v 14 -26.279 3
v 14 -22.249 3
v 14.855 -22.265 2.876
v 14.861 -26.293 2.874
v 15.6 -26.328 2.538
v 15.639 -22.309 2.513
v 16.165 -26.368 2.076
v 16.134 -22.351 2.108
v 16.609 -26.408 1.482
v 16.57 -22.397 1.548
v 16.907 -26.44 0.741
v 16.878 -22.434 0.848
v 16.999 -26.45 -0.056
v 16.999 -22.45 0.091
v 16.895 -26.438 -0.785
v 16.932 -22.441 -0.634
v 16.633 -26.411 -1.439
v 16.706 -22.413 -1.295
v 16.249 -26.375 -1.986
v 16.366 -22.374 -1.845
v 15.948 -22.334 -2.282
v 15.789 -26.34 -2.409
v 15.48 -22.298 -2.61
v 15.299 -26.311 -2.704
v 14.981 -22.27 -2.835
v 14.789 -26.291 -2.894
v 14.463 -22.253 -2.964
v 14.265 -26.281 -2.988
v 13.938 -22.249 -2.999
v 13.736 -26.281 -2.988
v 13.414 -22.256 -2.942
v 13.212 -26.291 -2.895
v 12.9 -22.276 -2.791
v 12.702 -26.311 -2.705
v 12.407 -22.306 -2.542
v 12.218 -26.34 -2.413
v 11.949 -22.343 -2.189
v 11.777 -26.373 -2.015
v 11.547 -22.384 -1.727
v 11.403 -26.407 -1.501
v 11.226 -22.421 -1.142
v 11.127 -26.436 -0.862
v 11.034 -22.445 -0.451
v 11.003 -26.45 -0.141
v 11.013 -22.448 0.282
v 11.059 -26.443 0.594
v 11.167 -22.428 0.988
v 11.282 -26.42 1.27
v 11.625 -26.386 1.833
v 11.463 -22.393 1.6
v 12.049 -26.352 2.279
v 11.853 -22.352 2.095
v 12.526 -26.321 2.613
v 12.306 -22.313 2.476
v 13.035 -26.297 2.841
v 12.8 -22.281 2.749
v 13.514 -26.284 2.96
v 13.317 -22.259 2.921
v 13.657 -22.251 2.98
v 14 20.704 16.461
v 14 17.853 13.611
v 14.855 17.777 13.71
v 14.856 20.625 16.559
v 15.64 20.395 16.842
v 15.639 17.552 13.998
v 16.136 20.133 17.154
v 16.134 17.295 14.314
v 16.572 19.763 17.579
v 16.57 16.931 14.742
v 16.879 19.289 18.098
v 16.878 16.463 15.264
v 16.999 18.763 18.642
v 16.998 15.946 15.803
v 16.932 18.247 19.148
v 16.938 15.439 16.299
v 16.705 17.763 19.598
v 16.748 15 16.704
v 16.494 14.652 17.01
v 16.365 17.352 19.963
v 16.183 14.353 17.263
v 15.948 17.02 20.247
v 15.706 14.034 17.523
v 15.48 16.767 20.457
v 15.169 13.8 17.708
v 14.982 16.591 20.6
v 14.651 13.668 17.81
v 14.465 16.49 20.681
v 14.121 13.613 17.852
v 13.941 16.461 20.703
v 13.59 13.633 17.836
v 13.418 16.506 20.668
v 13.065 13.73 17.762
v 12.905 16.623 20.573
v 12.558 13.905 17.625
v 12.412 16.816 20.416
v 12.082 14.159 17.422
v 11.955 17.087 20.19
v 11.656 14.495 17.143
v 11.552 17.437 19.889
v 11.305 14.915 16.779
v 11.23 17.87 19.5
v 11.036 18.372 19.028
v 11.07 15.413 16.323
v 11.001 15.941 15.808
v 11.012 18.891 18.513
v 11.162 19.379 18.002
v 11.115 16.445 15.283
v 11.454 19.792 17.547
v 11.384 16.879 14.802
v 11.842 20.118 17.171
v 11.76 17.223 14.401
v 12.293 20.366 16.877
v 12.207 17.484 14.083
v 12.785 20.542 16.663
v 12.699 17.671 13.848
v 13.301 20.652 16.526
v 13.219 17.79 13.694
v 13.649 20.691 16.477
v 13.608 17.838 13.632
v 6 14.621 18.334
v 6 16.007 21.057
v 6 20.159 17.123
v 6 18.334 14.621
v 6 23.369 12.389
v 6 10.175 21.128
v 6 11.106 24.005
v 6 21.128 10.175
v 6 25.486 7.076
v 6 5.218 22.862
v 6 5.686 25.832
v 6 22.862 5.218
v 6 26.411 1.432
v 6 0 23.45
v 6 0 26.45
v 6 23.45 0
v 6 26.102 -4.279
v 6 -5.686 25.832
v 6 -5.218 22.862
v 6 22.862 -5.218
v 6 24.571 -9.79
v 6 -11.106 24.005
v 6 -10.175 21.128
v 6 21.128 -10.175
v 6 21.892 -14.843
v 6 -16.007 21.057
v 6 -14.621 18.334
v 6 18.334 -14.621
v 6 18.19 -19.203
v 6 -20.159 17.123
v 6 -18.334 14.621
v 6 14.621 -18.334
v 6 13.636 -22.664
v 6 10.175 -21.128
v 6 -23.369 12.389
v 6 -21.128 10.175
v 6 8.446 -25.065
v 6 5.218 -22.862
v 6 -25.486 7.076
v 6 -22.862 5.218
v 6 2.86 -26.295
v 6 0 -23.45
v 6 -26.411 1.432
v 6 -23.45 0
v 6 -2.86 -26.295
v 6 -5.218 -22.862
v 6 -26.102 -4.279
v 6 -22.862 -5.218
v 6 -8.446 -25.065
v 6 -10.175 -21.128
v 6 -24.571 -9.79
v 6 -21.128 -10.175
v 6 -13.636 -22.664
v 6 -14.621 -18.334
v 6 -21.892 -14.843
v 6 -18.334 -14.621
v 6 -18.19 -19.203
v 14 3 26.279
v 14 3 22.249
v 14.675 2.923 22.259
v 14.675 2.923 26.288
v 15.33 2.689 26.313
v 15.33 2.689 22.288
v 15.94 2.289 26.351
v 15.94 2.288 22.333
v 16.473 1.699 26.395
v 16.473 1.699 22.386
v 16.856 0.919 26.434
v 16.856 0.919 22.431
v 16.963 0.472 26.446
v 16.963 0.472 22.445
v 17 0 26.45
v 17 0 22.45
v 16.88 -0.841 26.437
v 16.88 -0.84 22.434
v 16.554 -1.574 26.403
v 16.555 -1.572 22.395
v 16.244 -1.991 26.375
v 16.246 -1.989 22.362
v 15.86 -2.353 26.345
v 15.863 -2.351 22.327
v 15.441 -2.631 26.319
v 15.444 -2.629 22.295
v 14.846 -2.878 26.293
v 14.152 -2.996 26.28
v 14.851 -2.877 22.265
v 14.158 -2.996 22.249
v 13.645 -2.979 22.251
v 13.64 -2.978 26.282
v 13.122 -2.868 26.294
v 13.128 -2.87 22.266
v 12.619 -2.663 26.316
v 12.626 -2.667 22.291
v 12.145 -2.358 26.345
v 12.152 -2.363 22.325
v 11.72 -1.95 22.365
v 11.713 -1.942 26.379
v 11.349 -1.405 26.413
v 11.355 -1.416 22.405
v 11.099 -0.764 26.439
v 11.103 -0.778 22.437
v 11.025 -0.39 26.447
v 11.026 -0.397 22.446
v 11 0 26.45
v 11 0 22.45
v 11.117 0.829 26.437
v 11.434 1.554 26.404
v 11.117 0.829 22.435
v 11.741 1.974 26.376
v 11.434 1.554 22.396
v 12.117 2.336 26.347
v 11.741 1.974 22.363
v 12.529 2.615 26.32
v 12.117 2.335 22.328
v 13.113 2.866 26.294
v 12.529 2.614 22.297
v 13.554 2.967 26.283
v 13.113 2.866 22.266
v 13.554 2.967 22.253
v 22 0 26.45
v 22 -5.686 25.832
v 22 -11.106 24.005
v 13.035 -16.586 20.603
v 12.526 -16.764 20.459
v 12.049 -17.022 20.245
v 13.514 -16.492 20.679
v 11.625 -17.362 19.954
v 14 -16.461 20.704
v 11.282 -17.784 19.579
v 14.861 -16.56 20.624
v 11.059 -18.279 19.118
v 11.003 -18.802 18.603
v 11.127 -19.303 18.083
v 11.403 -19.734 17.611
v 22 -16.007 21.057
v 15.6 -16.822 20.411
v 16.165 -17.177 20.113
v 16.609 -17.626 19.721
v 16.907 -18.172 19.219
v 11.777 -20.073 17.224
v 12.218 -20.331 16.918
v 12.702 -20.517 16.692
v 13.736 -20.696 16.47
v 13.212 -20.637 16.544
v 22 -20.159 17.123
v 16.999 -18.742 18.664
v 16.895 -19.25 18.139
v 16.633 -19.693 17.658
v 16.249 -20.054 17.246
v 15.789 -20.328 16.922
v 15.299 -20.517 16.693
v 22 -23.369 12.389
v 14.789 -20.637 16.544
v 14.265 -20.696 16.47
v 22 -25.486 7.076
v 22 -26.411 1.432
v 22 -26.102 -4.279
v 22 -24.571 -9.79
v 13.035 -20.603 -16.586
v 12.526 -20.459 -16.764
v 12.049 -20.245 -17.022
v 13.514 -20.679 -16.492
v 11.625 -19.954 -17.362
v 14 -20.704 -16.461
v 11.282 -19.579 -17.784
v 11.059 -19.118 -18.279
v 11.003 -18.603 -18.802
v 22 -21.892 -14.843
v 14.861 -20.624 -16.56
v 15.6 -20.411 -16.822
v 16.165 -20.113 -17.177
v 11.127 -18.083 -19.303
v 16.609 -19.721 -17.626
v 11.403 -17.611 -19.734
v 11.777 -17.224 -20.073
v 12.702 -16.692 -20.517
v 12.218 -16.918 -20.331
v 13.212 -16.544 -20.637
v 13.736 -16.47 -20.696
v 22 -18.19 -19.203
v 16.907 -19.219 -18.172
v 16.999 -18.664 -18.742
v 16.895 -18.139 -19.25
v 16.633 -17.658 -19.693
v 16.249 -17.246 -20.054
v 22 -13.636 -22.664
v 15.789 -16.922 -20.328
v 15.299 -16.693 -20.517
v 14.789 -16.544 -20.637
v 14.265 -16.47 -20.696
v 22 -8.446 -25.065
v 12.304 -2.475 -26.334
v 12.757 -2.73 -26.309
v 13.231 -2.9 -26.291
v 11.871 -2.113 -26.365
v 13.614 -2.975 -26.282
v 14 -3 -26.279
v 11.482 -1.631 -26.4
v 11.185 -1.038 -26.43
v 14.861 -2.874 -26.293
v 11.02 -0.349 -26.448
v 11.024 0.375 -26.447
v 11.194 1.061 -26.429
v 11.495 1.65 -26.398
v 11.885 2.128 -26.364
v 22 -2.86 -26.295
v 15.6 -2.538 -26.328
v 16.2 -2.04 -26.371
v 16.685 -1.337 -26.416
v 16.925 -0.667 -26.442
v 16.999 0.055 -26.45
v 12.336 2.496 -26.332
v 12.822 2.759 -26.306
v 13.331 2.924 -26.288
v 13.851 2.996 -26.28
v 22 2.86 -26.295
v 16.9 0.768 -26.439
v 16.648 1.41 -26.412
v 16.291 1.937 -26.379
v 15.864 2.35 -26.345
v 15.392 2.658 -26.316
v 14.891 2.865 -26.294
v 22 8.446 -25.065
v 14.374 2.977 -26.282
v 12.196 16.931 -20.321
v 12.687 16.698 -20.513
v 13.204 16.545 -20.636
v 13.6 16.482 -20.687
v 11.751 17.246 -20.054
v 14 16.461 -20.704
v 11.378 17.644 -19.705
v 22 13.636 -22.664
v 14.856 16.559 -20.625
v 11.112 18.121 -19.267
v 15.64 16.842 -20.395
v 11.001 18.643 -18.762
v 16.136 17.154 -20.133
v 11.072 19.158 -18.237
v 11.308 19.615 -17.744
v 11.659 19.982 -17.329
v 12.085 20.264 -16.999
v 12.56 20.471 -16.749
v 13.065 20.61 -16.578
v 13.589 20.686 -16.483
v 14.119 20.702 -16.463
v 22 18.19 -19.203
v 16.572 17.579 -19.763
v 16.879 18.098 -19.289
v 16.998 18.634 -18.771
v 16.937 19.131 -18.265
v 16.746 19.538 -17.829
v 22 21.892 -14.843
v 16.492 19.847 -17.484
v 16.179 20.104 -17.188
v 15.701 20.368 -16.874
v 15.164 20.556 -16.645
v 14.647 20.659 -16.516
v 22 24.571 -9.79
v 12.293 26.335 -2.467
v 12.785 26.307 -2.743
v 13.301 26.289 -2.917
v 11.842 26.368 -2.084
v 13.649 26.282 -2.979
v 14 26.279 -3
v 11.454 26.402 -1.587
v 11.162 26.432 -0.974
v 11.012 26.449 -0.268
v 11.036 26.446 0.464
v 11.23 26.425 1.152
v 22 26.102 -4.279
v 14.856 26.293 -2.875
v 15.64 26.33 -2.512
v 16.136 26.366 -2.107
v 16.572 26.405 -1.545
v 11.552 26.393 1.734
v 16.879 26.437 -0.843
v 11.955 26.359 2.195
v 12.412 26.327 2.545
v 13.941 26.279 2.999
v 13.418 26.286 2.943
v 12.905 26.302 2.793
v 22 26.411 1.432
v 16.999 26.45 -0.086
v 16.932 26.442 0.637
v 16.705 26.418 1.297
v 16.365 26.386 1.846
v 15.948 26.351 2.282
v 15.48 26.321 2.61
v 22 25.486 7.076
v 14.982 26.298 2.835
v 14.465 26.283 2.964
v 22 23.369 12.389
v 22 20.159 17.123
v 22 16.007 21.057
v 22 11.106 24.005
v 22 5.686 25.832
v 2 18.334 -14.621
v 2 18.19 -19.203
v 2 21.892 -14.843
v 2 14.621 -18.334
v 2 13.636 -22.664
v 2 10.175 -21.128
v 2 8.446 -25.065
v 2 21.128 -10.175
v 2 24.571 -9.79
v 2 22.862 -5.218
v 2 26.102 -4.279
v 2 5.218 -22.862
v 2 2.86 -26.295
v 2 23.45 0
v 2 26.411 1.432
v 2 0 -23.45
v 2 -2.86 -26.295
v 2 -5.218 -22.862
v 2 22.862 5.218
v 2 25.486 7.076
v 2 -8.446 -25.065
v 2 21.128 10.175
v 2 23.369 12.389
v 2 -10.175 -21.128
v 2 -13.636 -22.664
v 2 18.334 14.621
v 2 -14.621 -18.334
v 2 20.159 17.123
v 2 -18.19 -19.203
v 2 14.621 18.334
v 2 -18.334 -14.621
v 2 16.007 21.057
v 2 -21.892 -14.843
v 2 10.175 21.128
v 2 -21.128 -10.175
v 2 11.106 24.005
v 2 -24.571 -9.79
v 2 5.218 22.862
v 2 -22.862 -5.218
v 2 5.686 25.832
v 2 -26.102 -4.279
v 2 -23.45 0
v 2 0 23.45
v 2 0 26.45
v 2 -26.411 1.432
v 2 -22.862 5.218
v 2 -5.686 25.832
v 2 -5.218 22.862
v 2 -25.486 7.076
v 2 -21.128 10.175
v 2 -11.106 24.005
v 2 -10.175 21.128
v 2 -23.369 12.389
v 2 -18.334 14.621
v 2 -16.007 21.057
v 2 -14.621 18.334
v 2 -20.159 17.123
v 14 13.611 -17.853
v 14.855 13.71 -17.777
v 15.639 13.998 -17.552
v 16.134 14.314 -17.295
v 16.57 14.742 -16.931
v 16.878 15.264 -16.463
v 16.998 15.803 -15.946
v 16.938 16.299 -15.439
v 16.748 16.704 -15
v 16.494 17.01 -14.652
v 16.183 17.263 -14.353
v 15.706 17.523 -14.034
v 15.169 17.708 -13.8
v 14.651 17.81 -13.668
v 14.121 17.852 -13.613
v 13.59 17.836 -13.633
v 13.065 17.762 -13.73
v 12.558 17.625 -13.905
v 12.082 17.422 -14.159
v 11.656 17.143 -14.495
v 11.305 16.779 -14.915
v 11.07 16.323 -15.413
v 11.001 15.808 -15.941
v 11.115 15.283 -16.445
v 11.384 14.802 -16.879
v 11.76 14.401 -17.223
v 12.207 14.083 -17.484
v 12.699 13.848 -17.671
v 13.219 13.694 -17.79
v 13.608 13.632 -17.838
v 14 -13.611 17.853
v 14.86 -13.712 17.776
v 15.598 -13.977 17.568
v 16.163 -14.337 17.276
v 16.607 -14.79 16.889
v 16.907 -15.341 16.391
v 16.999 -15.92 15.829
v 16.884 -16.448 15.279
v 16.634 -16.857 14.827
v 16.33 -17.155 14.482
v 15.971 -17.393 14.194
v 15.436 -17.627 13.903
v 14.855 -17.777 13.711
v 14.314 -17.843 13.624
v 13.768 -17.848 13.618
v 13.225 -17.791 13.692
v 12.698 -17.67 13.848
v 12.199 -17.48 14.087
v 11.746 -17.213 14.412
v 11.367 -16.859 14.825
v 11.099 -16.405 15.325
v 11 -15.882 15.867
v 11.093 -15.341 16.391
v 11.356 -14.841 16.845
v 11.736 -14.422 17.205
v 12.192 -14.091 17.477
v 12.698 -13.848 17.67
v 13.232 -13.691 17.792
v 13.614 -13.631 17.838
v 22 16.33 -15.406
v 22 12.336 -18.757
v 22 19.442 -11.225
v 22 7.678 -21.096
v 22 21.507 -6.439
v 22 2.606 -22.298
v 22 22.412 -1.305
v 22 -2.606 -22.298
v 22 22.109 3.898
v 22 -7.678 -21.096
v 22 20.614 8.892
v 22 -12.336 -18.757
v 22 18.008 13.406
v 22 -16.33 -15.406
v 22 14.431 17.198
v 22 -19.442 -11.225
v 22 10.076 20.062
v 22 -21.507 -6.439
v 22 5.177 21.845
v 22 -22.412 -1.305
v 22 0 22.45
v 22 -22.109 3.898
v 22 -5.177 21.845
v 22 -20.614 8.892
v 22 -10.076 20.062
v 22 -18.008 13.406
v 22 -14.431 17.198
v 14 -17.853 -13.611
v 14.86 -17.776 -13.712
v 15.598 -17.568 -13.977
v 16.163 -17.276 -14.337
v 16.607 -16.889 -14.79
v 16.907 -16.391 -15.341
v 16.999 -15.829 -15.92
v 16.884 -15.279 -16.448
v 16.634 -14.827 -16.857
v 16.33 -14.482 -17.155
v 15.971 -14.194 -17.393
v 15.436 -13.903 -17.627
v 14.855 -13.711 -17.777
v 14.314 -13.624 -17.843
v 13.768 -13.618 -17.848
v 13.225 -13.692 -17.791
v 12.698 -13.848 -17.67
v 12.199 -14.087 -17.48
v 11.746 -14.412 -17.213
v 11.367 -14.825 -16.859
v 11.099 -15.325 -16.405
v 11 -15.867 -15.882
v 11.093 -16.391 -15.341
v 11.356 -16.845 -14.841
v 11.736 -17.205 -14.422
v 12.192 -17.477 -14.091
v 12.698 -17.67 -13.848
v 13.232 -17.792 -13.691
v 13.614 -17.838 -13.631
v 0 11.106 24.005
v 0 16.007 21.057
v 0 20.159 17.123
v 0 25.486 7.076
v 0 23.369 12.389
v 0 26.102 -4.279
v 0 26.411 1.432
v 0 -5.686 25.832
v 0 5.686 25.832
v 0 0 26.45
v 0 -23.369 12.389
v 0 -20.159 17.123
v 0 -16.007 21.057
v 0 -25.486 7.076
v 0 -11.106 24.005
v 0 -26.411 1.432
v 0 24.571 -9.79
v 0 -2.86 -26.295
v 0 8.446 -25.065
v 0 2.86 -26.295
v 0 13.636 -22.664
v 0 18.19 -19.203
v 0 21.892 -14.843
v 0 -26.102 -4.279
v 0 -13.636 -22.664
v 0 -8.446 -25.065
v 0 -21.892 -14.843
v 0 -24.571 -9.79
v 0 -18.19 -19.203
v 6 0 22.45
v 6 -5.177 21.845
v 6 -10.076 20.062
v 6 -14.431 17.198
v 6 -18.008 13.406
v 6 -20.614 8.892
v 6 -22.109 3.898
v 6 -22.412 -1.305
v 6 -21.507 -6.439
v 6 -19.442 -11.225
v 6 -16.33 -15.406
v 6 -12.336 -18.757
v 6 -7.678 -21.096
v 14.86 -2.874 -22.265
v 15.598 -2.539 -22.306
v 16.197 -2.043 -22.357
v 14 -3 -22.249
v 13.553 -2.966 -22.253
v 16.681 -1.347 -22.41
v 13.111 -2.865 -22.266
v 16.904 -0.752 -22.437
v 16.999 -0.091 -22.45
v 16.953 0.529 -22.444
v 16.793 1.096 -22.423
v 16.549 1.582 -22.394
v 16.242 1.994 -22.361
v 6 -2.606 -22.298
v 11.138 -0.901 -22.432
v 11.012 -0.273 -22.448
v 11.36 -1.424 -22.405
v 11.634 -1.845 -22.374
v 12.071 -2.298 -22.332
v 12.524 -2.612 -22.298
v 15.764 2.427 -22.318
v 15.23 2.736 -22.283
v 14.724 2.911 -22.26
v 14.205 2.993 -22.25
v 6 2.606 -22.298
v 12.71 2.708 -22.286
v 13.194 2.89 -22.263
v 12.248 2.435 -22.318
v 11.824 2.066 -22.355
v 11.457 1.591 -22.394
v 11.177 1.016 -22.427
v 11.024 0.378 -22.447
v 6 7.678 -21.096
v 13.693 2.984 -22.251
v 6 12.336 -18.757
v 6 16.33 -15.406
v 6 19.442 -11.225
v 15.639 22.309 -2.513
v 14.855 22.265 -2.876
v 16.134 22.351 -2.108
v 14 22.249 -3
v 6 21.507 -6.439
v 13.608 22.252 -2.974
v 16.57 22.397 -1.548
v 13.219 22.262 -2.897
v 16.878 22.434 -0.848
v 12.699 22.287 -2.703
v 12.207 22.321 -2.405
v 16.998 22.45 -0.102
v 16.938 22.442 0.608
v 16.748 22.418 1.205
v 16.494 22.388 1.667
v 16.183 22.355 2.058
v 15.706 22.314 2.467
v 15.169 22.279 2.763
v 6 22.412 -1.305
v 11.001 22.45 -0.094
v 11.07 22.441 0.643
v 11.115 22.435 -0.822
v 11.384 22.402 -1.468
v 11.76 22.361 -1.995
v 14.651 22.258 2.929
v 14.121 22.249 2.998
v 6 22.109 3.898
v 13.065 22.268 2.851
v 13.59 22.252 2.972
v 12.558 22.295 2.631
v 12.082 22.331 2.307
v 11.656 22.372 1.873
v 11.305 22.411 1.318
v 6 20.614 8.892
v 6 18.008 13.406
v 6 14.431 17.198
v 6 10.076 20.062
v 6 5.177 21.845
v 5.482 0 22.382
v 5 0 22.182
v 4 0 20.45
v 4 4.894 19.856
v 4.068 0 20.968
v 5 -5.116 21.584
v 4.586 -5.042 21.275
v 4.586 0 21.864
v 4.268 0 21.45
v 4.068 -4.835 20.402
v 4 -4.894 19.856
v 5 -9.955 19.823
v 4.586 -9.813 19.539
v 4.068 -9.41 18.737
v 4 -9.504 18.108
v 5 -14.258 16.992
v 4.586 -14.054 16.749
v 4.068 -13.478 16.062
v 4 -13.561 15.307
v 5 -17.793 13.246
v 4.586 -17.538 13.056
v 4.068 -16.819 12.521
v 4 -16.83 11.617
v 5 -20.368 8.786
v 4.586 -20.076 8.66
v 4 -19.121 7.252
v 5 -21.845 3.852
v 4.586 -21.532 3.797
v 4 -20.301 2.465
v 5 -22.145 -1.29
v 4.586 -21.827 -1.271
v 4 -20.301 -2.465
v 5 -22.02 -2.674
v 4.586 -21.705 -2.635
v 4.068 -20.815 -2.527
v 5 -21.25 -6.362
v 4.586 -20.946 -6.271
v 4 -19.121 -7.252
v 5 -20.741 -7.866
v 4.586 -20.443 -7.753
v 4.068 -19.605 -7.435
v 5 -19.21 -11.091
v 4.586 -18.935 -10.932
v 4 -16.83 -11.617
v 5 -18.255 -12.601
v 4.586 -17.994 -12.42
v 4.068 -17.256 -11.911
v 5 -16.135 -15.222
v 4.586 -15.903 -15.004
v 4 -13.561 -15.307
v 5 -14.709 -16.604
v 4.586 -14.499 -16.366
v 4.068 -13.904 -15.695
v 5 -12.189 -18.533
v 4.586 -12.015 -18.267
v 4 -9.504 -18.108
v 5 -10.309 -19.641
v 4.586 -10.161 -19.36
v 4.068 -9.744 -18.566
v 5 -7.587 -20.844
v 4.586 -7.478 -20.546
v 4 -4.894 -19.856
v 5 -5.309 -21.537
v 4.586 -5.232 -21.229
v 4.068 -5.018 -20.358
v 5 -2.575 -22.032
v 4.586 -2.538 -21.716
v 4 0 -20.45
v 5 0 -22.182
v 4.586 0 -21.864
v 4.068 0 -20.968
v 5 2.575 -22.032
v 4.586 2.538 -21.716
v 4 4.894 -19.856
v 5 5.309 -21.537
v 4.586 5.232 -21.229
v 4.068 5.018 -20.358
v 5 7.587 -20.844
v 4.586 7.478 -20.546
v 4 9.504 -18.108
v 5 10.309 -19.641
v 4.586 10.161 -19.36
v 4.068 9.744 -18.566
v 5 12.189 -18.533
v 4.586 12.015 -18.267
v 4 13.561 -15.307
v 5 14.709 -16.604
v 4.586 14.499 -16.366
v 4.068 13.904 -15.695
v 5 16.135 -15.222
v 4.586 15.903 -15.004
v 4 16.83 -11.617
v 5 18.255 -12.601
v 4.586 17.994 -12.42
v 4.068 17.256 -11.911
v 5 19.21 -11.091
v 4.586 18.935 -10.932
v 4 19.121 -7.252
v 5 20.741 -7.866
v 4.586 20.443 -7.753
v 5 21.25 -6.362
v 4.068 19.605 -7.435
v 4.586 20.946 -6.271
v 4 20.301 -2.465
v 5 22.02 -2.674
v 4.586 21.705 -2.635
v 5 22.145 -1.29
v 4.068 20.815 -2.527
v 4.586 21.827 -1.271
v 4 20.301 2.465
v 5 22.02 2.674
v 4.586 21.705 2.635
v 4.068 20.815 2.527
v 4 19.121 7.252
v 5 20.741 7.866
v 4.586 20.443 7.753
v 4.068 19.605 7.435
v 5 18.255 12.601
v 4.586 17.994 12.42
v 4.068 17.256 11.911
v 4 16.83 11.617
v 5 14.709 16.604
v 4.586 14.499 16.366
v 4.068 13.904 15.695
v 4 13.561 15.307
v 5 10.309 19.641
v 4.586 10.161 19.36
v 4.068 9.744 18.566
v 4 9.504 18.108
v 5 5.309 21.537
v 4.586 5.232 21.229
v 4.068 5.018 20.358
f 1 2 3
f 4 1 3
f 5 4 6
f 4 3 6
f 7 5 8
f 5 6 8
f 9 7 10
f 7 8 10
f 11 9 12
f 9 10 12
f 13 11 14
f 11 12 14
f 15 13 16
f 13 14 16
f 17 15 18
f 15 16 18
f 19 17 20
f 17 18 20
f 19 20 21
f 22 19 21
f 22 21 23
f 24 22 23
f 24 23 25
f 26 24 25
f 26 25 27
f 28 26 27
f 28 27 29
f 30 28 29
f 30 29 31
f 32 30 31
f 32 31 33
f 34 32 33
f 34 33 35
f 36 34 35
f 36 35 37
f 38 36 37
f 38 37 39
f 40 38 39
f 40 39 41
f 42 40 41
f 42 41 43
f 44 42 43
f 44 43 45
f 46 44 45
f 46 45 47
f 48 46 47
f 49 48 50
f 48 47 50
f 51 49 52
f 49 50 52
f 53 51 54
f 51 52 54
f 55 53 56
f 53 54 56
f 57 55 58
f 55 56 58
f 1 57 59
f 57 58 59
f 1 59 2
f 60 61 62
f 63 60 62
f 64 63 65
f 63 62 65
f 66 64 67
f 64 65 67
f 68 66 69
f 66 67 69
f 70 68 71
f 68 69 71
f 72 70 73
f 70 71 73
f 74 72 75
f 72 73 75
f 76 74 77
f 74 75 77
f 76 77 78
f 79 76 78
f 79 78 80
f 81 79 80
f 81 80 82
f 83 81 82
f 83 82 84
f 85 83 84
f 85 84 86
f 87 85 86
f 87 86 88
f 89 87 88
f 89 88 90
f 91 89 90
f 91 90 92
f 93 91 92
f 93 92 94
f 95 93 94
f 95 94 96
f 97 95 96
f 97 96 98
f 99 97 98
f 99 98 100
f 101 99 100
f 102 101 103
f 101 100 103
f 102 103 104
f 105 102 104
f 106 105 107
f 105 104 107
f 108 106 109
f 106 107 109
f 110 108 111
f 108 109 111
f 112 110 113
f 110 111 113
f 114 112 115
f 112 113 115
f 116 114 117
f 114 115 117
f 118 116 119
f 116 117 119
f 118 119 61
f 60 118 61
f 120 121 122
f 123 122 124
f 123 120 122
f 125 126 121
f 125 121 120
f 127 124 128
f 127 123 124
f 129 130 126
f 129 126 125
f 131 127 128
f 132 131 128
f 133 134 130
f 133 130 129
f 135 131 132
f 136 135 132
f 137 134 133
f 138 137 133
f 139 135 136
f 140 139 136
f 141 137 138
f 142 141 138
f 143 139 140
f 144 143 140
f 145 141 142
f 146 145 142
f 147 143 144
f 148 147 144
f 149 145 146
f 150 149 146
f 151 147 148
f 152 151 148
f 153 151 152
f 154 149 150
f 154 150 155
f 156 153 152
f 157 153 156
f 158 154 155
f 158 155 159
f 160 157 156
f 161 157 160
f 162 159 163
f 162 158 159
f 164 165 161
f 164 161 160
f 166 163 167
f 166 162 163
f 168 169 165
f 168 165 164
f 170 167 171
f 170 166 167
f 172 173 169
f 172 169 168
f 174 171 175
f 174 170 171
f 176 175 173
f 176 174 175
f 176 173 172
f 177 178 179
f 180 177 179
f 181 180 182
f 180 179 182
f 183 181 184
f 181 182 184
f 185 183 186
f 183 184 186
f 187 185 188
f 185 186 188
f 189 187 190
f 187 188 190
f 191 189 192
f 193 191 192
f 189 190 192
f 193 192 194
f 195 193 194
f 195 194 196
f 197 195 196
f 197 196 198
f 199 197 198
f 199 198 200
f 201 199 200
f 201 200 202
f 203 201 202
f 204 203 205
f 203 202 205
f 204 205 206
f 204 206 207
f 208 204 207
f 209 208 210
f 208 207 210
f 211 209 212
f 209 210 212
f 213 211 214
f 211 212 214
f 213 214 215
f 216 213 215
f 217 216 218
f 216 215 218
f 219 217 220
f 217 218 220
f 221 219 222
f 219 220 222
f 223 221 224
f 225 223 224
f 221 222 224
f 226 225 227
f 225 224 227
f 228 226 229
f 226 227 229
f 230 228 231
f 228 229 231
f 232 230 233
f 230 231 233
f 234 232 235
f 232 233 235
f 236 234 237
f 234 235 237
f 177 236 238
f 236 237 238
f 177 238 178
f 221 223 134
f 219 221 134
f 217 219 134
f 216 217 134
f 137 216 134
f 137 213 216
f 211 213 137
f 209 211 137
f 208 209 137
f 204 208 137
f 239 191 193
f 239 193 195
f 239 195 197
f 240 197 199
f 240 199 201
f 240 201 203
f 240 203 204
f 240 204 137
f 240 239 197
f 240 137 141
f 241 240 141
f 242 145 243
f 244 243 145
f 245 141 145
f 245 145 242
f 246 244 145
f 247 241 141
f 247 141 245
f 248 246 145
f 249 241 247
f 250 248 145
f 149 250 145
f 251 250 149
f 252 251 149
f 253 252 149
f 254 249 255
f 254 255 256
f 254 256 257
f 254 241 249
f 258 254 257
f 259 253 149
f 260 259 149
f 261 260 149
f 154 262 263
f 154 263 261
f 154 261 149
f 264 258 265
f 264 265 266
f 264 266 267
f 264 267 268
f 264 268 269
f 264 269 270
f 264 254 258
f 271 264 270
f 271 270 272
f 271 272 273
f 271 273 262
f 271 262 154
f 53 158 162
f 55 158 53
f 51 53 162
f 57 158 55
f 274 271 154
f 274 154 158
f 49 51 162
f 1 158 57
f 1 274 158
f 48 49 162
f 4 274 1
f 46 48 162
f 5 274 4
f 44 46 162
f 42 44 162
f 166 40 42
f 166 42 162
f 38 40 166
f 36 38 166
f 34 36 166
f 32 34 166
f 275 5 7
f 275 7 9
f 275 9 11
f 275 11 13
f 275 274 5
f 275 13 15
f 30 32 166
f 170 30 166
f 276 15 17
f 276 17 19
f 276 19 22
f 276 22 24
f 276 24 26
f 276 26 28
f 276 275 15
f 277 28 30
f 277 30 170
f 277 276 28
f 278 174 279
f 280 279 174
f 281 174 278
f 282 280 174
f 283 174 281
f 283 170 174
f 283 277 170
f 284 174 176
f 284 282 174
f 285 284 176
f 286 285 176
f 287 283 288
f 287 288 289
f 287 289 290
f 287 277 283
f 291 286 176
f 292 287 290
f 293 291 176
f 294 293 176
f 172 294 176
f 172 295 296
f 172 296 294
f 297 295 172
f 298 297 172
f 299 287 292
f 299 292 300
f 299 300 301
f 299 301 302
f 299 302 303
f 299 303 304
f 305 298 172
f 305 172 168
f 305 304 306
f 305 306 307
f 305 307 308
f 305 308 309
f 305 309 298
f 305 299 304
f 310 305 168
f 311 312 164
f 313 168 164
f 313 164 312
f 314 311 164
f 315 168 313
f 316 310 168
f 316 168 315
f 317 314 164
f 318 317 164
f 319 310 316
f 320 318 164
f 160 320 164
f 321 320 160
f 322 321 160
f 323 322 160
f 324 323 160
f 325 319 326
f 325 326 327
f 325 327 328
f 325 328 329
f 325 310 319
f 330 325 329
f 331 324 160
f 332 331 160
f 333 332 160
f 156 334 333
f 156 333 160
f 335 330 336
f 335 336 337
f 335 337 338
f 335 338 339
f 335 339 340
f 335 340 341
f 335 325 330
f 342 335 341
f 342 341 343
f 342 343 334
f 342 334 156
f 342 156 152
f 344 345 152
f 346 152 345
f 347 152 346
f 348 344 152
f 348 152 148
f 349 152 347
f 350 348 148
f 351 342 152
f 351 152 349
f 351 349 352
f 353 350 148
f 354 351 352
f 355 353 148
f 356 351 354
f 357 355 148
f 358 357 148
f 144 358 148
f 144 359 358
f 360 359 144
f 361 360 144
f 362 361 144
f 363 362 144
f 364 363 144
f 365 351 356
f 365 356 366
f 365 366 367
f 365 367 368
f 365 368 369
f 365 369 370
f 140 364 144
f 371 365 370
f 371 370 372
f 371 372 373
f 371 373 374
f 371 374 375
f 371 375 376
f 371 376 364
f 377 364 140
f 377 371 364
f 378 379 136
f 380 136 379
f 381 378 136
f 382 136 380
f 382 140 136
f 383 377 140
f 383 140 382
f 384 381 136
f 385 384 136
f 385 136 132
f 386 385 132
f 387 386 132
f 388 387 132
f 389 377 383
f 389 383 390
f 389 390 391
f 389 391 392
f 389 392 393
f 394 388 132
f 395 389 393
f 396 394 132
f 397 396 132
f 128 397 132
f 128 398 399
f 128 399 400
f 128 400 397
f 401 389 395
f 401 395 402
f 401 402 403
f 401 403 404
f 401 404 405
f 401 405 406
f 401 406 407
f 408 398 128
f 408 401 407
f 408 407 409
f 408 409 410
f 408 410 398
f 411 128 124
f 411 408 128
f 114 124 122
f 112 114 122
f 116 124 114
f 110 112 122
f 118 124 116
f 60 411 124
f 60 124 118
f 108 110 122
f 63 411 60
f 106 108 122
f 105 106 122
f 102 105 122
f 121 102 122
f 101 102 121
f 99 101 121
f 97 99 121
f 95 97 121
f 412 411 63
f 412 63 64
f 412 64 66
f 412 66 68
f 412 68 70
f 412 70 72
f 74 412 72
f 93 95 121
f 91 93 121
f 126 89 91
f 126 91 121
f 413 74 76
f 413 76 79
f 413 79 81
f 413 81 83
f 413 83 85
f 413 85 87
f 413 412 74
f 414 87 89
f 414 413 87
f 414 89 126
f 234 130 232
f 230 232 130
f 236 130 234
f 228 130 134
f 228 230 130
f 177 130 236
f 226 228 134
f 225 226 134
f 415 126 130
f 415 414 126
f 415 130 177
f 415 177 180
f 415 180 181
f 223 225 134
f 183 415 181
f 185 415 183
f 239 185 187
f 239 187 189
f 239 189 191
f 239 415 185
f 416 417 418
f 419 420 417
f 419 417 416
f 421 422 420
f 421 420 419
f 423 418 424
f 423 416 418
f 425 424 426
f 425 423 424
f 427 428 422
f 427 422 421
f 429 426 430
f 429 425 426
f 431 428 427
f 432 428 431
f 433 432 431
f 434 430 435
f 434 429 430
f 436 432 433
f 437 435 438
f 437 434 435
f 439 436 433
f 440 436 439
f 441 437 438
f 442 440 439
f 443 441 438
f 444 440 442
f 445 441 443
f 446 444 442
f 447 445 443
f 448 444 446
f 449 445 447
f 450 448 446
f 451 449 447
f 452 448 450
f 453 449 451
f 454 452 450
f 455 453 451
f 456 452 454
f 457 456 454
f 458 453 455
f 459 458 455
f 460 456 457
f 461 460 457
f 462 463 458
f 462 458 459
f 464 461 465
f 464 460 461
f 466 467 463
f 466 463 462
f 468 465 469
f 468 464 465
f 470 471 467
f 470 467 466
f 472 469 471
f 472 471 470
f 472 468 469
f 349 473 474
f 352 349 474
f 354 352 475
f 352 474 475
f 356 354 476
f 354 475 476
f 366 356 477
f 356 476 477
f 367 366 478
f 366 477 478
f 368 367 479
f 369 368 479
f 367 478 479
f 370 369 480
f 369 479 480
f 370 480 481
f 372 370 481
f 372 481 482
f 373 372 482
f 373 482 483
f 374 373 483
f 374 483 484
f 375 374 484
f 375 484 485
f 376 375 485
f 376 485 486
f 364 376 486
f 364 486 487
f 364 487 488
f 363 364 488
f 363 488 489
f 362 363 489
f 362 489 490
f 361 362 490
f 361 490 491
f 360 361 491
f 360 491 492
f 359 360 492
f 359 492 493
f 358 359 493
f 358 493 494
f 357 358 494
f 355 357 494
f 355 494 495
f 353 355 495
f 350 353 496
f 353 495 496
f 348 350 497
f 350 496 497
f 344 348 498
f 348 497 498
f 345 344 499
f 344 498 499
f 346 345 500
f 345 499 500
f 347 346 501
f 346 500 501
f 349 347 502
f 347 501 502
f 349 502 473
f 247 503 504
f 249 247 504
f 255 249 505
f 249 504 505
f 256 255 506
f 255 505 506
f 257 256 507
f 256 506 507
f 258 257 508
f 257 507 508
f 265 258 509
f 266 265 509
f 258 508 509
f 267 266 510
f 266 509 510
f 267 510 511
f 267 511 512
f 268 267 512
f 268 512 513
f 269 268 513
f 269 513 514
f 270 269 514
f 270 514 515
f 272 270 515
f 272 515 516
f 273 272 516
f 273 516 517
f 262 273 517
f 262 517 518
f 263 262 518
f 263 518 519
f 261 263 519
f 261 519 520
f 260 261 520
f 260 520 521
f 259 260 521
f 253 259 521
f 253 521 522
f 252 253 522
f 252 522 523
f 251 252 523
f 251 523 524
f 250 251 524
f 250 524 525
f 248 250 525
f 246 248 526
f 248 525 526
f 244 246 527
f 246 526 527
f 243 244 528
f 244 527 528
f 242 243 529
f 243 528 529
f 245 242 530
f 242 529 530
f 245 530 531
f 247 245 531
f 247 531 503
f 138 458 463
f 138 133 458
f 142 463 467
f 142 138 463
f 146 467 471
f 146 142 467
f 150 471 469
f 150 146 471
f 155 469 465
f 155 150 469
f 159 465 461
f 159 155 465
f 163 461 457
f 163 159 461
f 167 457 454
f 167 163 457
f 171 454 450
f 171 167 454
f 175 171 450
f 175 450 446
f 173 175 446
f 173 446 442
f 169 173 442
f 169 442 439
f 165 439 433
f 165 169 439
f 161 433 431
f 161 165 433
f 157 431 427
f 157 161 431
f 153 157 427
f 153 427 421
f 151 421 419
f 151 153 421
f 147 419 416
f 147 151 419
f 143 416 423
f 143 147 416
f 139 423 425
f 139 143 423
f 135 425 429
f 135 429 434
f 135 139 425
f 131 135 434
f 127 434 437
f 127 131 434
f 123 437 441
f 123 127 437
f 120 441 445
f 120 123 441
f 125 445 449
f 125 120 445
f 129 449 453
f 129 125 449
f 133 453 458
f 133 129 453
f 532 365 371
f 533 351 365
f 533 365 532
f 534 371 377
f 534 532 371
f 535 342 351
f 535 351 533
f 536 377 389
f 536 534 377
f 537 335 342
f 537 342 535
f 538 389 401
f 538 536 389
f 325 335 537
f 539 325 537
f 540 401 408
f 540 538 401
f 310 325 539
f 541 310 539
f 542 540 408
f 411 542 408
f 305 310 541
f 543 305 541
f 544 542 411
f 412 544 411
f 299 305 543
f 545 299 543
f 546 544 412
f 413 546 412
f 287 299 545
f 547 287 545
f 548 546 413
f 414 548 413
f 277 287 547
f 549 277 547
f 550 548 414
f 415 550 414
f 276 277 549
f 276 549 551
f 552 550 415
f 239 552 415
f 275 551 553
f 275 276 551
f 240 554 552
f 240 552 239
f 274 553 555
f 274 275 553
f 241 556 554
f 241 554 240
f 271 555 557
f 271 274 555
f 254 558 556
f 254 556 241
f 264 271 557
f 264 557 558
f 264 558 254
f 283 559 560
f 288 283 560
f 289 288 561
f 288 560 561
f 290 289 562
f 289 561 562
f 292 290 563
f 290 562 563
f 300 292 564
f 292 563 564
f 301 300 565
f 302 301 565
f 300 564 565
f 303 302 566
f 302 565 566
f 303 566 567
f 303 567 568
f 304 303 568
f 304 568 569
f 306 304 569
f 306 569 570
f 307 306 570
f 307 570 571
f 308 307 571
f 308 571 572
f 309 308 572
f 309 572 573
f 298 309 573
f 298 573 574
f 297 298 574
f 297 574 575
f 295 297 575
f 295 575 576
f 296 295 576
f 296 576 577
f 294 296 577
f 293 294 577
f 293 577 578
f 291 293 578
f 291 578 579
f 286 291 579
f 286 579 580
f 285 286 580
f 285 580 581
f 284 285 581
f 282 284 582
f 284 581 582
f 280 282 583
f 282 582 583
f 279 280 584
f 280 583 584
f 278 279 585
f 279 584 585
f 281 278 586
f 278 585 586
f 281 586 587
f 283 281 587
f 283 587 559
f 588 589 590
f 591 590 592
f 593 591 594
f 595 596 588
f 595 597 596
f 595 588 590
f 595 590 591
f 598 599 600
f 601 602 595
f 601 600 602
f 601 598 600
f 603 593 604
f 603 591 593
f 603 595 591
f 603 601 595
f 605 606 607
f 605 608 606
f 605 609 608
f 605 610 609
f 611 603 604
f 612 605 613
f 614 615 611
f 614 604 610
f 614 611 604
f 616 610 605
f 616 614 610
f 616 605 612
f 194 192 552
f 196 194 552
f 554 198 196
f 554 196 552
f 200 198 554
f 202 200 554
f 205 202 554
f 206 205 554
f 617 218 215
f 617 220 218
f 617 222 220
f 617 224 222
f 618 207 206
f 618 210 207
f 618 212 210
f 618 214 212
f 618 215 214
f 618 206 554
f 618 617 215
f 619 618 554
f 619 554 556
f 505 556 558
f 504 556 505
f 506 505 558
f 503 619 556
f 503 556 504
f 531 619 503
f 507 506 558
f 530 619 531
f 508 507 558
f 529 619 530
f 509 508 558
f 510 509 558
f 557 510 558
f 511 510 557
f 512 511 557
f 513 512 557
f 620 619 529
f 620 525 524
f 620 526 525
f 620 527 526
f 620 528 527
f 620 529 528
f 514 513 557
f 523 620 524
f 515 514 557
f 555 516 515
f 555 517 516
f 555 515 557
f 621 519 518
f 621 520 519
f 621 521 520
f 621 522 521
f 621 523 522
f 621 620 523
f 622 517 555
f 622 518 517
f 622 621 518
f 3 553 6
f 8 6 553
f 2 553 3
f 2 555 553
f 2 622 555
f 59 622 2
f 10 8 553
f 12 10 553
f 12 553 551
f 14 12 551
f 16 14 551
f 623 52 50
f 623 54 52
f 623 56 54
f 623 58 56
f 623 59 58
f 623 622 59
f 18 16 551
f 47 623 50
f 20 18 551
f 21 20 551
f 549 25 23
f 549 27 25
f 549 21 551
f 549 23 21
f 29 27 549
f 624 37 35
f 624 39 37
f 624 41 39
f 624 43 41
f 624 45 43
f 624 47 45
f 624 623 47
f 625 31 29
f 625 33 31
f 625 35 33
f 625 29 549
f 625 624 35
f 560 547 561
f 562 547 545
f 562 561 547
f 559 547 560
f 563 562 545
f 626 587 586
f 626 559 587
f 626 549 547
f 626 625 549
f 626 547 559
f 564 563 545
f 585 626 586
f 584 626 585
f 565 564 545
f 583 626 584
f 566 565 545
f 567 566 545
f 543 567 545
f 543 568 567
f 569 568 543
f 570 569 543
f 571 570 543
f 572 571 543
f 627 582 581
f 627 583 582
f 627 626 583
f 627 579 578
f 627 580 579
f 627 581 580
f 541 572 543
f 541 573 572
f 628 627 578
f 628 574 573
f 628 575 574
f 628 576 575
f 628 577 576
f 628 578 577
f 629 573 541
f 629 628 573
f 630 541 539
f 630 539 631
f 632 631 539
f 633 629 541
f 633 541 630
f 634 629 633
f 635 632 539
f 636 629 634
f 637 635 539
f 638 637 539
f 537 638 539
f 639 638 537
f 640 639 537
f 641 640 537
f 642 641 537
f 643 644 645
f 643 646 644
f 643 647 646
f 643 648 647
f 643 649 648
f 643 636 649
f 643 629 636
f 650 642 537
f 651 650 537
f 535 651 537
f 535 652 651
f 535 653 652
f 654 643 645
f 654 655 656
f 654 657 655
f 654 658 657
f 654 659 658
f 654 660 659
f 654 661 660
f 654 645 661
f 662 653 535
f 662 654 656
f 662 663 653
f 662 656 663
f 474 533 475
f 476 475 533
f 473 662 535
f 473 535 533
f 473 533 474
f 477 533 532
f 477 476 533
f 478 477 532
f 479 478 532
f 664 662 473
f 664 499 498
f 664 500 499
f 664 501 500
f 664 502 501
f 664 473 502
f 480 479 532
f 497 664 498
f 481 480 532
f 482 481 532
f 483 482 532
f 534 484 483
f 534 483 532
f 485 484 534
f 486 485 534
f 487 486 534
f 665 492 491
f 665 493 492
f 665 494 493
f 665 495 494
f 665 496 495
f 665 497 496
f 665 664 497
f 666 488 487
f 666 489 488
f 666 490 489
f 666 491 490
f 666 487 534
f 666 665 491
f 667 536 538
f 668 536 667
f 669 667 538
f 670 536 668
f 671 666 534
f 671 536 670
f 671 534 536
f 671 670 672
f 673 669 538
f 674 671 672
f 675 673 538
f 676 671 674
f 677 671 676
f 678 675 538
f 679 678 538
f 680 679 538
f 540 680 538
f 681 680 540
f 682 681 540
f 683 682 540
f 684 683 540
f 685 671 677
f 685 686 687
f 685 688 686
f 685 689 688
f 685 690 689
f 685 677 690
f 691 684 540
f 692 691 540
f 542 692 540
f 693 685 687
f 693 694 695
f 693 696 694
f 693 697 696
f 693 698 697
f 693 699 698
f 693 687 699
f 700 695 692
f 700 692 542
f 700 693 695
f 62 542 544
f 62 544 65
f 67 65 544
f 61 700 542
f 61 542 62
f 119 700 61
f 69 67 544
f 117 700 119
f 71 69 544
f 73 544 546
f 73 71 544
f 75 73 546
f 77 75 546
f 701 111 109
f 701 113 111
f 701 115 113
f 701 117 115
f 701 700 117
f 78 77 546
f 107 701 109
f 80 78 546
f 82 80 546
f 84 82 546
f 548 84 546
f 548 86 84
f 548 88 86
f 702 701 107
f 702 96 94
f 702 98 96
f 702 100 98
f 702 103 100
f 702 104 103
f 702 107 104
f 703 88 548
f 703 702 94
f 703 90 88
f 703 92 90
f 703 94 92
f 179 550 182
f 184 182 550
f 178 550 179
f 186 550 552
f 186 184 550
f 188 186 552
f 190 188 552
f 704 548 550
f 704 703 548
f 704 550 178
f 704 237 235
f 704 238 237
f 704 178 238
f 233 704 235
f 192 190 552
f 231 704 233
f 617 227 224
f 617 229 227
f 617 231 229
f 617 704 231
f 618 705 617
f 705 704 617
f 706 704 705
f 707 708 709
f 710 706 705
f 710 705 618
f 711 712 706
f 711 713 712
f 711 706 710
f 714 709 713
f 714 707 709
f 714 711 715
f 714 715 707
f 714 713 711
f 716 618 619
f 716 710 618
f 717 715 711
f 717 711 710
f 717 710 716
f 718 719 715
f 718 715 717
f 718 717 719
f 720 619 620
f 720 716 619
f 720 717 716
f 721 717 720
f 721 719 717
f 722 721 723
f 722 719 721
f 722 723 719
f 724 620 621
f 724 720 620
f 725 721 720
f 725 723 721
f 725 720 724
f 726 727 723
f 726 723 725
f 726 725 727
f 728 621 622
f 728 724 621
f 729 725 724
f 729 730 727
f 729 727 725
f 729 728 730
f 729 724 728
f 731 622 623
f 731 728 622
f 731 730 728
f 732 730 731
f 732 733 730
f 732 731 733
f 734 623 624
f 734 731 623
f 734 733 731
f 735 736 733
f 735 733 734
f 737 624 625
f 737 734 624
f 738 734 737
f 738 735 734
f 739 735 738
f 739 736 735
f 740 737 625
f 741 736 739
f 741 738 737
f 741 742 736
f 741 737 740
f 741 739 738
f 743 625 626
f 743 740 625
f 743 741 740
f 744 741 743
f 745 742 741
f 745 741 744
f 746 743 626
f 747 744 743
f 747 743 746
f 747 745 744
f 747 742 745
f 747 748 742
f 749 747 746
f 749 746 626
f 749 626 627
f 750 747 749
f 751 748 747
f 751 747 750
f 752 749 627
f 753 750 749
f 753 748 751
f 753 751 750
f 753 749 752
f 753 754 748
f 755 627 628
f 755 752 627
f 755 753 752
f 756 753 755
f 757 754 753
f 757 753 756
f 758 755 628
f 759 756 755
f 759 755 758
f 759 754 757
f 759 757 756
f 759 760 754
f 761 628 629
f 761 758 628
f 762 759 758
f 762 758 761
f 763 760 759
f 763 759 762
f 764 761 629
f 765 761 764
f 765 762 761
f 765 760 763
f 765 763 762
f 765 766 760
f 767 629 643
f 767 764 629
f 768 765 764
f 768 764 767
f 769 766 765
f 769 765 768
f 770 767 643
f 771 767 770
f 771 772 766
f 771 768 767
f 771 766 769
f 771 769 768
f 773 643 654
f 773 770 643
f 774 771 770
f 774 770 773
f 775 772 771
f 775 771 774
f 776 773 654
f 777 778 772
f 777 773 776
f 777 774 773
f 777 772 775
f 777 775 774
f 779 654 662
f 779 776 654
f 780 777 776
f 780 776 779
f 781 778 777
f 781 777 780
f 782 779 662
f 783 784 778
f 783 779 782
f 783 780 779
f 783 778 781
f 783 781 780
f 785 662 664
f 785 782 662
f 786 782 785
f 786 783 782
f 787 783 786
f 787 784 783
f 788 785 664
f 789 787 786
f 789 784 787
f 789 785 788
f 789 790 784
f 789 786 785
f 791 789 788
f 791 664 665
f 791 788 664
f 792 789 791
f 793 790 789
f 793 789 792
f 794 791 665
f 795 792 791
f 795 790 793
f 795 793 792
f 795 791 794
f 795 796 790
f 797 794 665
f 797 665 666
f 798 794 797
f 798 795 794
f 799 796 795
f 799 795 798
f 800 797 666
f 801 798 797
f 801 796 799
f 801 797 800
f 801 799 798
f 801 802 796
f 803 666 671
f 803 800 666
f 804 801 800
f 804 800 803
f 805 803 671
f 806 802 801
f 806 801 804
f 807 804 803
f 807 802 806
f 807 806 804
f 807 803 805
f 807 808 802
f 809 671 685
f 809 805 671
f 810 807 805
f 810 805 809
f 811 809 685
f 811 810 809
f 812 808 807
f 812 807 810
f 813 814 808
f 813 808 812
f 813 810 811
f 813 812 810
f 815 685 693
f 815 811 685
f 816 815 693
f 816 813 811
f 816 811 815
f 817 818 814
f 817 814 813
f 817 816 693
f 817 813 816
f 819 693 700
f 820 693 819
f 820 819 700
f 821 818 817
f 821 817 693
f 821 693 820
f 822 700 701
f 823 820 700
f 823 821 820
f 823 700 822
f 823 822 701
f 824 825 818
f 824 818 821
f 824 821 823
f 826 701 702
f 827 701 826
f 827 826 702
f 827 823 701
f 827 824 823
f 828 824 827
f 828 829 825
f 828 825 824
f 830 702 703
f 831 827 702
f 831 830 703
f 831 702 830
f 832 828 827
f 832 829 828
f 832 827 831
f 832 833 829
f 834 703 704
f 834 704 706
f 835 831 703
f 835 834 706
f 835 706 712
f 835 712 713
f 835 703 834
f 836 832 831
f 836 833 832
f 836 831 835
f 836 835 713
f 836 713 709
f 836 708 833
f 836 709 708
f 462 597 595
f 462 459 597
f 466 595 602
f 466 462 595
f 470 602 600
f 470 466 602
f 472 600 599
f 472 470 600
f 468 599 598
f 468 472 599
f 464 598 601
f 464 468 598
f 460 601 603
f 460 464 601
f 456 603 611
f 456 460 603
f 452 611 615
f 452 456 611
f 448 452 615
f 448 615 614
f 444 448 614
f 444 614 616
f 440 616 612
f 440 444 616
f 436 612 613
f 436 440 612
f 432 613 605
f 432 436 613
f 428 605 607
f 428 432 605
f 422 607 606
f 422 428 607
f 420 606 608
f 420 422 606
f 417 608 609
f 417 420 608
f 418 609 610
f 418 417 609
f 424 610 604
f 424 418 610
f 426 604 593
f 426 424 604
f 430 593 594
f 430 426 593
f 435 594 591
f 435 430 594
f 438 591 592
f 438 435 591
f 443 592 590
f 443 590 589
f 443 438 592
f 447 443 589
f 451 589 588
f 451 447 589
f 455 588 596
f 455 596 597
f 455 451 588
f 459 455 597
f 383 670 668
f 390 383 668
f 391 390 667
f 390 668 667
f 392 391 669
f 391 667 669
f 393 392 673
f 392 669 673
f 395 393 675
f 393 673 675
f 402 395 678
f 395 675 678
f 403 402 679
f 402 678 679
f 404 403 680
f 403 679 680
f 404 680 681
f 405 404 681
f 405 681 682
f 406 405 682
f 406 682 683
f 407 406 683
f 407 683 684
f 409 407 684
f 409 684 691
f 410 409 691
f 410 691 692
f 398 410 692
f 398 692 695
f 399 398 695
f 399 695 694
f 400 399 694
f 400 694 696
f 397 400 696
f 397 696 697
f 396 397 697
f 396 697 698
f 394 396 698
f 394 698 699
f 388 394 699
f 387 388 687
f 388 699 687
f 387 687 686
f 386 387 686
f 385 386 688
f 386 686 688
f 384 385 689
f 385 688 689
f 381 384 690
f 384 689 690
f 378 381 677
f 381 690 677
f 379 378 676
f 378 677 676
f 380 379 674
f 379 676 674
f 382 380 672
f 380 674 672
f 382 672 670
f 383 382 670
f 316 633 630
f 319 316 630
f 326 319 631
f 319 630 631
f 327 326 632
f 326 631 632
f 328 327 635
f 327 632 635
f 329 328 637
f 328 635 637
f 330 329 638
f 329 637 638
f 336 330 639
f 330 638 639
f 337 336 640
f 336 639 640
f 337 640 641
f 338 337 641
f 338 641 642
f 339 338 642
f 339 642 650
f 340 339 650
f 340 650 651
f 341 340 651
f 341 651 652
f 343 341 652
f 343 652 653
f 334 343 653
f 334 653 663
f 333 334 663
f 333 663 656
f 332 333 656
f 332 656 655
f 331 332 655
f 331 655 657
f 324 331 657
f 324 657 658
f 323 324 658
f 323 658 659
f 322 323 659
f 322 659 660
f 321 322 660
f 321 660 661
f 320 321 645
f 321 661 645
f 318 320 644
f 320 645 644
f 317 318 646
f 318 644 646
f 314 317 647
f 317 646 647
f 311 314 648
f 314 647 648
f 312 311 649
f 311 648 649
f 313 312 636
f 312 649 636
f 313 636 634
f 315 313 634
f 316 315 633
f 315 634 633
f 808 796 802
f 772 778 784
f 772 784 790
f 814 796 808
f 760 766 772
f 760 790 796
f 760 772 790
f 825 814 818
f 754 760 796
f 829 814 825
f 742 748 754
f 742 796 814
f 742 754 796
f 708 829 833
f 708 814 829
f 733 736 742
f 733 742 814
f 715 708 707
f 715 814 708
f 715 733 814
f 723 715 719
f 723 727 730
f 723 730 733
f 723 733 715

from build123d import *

# Parameters (mm, degrees)
SKETCH2_R          = 3
CUT_EXTRUDE1_DEPTH = 100
CIRPATTERN1_COUNT  = 8
FILLET1_R          = 2


with BuildPart() as part:
    # Sketch1 → Revolve1 (revolve)
    with BuildSketch(Plane(origin=(0, 0, 0), x_dir=(1, 0, 0), z_dir=(0, 1, 0)), mode=Mode.PRIVATE) as revolve1_sk:
        Polygon((0, 0), (0, 26.45), (2, 26.45), (2, 23.45), (6, 23.45), (6, 26.45), (22, 26.45), (22, 22.45), (4, 22.45), (4, 0), align=None)
    revolve(revolve1_sk.sketch.rotate(Axis((0, 0, 0), (1, 0, 0)), 180), axis=Axis((0, 0, 0), (1, 0, 0)))

    # Sketch2 → Cut-Extrude1 (cut)
    with BuildSketch(Plane(origin=(0, 0, 0), x_dir=(1, 0, 0), z_dir=(0, 1, 0))):
        with Locations(Location((14, 0, 0), (0, 0, 270))):
            Circle(SKETCH2_R)
    cut_extrude1 = extrude(amount=-CUT_EXTRUDE1_DEPTH, mode=Mode.SUBTRACT)

    # CirPattern1: Cut-Extrude1 ×8 about axis
    cirpattern1_axis = Axis((4, 0, 0), (1, 0, 0))
    for i in range(1, CIRPATTERN1_COUNT):
        add(cut_extrude1.rotate(cirpattern1_axis, i * 360 / CIRPATTERN1_COUNT), mode=Mode.SUBTRACT)

    # Fillet1
    fillet1_edges = [part.edges().sort_by_distance(p)[0] for p in [
        (4, 0, -22.45),
    ]]
    fillet(fillet1_edges, radius=FILLET1_R)


solid = part.part
